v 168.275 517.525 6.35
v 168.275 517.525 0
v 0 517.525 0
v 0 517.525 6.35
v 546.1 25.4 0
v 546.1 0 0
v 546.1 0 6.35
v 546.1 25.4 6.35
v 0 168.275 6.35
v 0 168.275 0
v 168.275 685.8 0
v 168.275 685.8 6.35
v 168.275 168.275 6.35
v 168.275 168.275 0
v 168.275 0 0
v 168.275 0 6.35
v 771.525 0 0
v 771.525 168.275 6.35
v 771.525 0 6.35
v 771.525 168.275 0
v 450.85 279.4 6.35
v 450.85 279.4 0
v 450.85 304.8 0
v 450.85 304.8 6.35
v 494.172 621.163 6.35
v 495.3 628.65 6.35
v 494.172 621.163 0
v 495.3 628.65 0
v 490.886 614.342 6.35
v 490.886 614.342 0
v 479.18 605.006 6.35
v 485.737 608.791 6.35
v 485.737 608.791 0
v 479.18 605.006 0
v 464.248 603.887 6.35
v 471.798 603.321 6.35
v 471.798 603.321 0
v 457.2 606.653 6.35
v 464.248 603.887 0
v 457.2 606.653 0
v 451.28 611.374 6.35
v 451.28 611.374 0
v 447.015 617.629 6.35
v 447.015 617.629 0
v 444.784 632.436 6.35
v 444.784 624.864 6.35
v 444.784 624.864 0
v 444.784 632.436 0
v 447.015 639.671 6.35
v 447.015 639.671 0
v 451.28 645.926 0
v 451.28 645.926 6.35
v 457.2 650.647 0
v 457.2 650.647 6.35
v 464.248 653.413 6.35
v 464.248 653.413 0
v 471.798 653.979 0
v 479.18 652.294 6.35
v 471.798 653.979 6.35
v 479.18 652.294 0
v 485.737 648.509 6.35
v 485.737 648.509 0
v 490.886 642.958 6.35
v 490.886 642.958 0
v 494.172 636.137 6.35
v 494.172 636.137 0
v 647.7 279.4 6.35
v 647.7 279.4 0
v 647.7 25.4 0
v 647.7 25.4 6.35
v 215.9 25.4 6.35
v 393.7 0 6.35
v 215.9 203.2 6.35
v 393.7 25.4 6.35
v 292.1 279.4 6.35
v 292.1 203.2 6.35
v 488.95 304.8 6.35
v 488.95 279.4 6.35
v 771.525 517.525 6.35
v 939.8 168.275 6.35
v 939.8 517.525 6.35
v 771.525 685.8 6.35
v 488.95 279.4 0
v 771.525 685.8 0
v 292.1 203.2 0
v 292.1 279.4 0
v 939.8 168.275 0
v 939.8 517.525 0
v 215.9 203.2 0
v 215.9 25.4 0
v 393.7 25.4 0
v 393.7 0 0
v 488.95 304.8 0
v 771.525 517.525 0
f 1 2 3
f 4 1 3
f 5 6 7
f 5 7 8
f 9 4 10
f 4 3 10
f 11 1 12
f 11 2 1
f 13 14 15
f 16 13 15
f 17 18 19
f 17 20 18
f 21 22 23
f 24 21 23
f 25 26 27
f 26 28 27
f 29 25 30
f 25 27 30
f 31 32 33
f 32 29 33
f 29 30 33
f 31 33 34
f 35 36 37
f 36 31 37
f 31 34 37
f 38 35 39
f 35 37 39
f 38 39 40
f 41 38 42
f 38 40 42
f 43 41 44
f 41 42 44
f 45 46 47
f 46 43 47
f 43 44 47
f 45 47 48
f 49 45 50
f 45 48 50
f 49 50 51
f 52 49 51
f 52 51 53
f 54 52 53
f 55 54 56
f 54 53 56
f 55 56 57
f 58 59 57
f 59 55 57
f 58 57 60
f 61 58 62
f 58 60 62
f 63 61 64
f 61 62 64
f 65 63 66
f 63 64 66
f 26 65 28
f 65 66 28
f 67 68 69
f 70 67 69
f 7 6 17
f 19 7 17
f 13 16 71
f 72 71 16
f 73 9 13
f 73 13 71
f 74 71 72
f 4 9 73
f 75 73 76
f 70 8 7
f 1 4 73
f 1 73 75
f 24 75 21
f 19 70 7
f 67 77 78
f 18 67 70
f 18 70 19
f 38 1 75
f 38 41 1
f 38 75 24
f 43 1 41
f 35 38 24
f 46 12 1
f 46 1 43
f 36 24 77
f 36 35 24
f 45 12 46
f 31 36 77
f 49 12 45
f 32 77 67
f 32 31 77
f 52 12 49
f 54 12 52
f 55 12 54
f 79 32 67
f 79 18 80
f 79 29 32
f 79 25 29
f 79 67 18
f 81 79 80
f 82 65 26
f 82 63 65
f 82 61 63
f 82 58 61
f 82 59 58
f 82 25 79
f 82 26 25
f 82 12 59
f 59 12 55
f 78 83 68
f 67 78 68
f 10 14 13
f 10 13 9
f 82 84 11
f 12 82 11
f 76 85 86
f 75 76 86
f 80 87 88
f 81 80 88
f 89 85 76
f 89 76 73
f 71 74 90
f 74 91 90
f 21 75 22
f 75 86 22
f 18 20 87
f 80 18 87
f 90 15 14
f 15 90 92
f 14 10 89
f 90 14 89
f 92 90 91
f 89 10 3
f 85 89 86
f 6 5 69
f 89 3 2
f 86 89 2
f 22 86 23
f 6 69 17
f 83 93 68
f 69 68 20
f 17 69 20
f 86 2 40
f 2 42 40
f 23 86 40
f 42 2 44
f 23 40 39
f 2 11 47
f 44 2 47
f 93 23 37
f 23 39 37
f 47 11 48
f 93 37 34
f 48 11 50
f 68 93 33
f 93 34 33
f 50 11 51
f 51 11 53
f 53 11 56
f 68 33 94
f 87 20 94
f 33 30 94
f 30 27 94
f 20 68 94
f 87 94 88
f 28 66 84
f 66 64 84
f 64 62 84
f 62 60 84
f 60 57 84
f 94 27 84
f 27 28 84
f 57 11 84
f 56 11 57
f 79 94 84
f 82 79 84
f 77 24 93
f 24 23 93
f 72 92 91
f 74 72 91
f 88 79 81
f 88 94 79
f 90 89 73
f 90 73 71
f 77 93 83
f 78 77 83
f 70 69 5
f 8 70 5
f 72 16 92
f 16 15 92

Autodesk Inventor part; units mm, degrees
ref_plane "YZ Plane" through (0, 0, 0) normal (1, 0, 0) x (0, 1, 0)
ref_plane "XZ Plane" through (0, 0, 0) normal (0, 1, 0) x (-1, 0, 0)
ref_plane "XY Plane" through (0, 0, 0) normal (0, 0, 1) x (1, 0, 0)
sketch "Sketch1" plane through (0, 0, 0) normal (0, 0, 1) x (1, 0, 0)
  line L0 (0, 0) -> (168.275, 0) construction
  line L1 (939.8, 0) -> (939.8, 168.275) construction
  line L2 (939.8, 685.8) -> (771.525, 685.8) construction
  line L3 (0, 685.8) -> (0, 517.525) construction
  line L4 (168.275, 517.525) -> (771.525, 517.525) construction
  line L5 (771.525, 517.525) -> (771.525, 168.275) construction
  line L6 (771.525, 168.275) -> (168.275, 168.275) construction
  line L7 (168.275, 168.275) -> (168.275, 517.525) construction
  line L8 (168.275, 517.525) -> (168.275, 685.8)
  line L9 (168.275, 517.525) -> (0, 517.525)
  line L10 (771.525, 517.525) -> (771.525, 685.8)
  line L11 (771.525, 517.525) -> (939.8, 517.525)
  line L12 (771.525, 168.275) -> (939.8, 168.275)
  line L13 (771.525, 168.275) -> (771.525, 0)
  line L14 (168.275, 168.275) -> (168.275, 0)
  line L15 (168.275, 168.275) -> (0, 168.275)
  line L16 (771.525, 685.8) -> (168.275, 685.8)
  line L17 (168.275, 685.8) -> (0, 685.8) construction
  line L18 (939.8, 517.525) -> (939.8, 685.8) construction
  line L19 (168.275, 0) -> (393.7, 0)
  line L20 (771.525, 0) -> (939.8, 0) construction
  line L21 (0, 168.275) -> (0, 0) construction
  line L22 (0, 517.525) -> (0, 168.275)
  line L23 (939.8, 168.275) -> (939.8, 517.525)
  line L24 (393.7, 0) -> (393.7, 25.4)
  line L25 (546.1, 0) -> (546.1, 25.4)
  line L26 (393.7, 25.4) -> (215.9, 25.4)
  line L27 (292.1, 203.2) -> (292.1, 279.4)
  line L28 (647.7, 279.4) -> (647.7, 25.4)
  line L29 (647.7, 25.4) -> (546.1, 25.4)
  line L30 (546.1, 0) -> (771.525, 0)
  line L31 (393.7, 0) -> (546.1, 0) construction
  line L32 (450.85, 279.4) -> (450.85, 304.8)
  line L33 (450.85, 304.8) -> (488.95, 304.8)
  line L34 (488.95, 304.8) -> (488.95, 279.4)
  line L35 (292.1, 279.4) -> (450.85, 279.4)
  line L36 (488.95, 279.4) -> (647.7, 279.4)
  circle A0 centre (469.9, 628.65) radius 25.4
  line L37 (292.1, 203.2) -> (215.9, 203.2)
  line L38 (215.9, 203.2) -> (215.9, 25.4)
  point P0 (469.9, 685.8)
  dimension "d0" = 939.8
  dimension "d1" = 685.8
  dimension "d2" = 603.25
  dimension "d3" = 349.25
  dimension "d4" = 168.275
  dimension "d5" = 168.275
  dimension "d6" = 168.275
  dimension "d8" = 168.275
  dimension "d11" = 152.4
  dimension "d12" = 225.425
  dimension "d13" = 225.425
  dimension "d14" = 25.4
  dimension "d15" = 355.6
  dimension "d17" = 25.4
  dimension "d18" = 38.1
  dimension "d19" = 50.8
  dimension "d20" = 57.15
  dimension "d21" = 254
  dimension "d22" = 123.825
  dimension "d23" = 123.825
  dimension "d24" = 76.2
  dimension "d25" = 177.8
extrude "Extrusion1" add sketch "Sketch1" along normal blind 6.35
equation "\"d4\" = d6"
equation "\"d5\" = d8"
equation "\"d12\" = d13"
equation "\"d22\" = d23"
properties part number "belly pan"
